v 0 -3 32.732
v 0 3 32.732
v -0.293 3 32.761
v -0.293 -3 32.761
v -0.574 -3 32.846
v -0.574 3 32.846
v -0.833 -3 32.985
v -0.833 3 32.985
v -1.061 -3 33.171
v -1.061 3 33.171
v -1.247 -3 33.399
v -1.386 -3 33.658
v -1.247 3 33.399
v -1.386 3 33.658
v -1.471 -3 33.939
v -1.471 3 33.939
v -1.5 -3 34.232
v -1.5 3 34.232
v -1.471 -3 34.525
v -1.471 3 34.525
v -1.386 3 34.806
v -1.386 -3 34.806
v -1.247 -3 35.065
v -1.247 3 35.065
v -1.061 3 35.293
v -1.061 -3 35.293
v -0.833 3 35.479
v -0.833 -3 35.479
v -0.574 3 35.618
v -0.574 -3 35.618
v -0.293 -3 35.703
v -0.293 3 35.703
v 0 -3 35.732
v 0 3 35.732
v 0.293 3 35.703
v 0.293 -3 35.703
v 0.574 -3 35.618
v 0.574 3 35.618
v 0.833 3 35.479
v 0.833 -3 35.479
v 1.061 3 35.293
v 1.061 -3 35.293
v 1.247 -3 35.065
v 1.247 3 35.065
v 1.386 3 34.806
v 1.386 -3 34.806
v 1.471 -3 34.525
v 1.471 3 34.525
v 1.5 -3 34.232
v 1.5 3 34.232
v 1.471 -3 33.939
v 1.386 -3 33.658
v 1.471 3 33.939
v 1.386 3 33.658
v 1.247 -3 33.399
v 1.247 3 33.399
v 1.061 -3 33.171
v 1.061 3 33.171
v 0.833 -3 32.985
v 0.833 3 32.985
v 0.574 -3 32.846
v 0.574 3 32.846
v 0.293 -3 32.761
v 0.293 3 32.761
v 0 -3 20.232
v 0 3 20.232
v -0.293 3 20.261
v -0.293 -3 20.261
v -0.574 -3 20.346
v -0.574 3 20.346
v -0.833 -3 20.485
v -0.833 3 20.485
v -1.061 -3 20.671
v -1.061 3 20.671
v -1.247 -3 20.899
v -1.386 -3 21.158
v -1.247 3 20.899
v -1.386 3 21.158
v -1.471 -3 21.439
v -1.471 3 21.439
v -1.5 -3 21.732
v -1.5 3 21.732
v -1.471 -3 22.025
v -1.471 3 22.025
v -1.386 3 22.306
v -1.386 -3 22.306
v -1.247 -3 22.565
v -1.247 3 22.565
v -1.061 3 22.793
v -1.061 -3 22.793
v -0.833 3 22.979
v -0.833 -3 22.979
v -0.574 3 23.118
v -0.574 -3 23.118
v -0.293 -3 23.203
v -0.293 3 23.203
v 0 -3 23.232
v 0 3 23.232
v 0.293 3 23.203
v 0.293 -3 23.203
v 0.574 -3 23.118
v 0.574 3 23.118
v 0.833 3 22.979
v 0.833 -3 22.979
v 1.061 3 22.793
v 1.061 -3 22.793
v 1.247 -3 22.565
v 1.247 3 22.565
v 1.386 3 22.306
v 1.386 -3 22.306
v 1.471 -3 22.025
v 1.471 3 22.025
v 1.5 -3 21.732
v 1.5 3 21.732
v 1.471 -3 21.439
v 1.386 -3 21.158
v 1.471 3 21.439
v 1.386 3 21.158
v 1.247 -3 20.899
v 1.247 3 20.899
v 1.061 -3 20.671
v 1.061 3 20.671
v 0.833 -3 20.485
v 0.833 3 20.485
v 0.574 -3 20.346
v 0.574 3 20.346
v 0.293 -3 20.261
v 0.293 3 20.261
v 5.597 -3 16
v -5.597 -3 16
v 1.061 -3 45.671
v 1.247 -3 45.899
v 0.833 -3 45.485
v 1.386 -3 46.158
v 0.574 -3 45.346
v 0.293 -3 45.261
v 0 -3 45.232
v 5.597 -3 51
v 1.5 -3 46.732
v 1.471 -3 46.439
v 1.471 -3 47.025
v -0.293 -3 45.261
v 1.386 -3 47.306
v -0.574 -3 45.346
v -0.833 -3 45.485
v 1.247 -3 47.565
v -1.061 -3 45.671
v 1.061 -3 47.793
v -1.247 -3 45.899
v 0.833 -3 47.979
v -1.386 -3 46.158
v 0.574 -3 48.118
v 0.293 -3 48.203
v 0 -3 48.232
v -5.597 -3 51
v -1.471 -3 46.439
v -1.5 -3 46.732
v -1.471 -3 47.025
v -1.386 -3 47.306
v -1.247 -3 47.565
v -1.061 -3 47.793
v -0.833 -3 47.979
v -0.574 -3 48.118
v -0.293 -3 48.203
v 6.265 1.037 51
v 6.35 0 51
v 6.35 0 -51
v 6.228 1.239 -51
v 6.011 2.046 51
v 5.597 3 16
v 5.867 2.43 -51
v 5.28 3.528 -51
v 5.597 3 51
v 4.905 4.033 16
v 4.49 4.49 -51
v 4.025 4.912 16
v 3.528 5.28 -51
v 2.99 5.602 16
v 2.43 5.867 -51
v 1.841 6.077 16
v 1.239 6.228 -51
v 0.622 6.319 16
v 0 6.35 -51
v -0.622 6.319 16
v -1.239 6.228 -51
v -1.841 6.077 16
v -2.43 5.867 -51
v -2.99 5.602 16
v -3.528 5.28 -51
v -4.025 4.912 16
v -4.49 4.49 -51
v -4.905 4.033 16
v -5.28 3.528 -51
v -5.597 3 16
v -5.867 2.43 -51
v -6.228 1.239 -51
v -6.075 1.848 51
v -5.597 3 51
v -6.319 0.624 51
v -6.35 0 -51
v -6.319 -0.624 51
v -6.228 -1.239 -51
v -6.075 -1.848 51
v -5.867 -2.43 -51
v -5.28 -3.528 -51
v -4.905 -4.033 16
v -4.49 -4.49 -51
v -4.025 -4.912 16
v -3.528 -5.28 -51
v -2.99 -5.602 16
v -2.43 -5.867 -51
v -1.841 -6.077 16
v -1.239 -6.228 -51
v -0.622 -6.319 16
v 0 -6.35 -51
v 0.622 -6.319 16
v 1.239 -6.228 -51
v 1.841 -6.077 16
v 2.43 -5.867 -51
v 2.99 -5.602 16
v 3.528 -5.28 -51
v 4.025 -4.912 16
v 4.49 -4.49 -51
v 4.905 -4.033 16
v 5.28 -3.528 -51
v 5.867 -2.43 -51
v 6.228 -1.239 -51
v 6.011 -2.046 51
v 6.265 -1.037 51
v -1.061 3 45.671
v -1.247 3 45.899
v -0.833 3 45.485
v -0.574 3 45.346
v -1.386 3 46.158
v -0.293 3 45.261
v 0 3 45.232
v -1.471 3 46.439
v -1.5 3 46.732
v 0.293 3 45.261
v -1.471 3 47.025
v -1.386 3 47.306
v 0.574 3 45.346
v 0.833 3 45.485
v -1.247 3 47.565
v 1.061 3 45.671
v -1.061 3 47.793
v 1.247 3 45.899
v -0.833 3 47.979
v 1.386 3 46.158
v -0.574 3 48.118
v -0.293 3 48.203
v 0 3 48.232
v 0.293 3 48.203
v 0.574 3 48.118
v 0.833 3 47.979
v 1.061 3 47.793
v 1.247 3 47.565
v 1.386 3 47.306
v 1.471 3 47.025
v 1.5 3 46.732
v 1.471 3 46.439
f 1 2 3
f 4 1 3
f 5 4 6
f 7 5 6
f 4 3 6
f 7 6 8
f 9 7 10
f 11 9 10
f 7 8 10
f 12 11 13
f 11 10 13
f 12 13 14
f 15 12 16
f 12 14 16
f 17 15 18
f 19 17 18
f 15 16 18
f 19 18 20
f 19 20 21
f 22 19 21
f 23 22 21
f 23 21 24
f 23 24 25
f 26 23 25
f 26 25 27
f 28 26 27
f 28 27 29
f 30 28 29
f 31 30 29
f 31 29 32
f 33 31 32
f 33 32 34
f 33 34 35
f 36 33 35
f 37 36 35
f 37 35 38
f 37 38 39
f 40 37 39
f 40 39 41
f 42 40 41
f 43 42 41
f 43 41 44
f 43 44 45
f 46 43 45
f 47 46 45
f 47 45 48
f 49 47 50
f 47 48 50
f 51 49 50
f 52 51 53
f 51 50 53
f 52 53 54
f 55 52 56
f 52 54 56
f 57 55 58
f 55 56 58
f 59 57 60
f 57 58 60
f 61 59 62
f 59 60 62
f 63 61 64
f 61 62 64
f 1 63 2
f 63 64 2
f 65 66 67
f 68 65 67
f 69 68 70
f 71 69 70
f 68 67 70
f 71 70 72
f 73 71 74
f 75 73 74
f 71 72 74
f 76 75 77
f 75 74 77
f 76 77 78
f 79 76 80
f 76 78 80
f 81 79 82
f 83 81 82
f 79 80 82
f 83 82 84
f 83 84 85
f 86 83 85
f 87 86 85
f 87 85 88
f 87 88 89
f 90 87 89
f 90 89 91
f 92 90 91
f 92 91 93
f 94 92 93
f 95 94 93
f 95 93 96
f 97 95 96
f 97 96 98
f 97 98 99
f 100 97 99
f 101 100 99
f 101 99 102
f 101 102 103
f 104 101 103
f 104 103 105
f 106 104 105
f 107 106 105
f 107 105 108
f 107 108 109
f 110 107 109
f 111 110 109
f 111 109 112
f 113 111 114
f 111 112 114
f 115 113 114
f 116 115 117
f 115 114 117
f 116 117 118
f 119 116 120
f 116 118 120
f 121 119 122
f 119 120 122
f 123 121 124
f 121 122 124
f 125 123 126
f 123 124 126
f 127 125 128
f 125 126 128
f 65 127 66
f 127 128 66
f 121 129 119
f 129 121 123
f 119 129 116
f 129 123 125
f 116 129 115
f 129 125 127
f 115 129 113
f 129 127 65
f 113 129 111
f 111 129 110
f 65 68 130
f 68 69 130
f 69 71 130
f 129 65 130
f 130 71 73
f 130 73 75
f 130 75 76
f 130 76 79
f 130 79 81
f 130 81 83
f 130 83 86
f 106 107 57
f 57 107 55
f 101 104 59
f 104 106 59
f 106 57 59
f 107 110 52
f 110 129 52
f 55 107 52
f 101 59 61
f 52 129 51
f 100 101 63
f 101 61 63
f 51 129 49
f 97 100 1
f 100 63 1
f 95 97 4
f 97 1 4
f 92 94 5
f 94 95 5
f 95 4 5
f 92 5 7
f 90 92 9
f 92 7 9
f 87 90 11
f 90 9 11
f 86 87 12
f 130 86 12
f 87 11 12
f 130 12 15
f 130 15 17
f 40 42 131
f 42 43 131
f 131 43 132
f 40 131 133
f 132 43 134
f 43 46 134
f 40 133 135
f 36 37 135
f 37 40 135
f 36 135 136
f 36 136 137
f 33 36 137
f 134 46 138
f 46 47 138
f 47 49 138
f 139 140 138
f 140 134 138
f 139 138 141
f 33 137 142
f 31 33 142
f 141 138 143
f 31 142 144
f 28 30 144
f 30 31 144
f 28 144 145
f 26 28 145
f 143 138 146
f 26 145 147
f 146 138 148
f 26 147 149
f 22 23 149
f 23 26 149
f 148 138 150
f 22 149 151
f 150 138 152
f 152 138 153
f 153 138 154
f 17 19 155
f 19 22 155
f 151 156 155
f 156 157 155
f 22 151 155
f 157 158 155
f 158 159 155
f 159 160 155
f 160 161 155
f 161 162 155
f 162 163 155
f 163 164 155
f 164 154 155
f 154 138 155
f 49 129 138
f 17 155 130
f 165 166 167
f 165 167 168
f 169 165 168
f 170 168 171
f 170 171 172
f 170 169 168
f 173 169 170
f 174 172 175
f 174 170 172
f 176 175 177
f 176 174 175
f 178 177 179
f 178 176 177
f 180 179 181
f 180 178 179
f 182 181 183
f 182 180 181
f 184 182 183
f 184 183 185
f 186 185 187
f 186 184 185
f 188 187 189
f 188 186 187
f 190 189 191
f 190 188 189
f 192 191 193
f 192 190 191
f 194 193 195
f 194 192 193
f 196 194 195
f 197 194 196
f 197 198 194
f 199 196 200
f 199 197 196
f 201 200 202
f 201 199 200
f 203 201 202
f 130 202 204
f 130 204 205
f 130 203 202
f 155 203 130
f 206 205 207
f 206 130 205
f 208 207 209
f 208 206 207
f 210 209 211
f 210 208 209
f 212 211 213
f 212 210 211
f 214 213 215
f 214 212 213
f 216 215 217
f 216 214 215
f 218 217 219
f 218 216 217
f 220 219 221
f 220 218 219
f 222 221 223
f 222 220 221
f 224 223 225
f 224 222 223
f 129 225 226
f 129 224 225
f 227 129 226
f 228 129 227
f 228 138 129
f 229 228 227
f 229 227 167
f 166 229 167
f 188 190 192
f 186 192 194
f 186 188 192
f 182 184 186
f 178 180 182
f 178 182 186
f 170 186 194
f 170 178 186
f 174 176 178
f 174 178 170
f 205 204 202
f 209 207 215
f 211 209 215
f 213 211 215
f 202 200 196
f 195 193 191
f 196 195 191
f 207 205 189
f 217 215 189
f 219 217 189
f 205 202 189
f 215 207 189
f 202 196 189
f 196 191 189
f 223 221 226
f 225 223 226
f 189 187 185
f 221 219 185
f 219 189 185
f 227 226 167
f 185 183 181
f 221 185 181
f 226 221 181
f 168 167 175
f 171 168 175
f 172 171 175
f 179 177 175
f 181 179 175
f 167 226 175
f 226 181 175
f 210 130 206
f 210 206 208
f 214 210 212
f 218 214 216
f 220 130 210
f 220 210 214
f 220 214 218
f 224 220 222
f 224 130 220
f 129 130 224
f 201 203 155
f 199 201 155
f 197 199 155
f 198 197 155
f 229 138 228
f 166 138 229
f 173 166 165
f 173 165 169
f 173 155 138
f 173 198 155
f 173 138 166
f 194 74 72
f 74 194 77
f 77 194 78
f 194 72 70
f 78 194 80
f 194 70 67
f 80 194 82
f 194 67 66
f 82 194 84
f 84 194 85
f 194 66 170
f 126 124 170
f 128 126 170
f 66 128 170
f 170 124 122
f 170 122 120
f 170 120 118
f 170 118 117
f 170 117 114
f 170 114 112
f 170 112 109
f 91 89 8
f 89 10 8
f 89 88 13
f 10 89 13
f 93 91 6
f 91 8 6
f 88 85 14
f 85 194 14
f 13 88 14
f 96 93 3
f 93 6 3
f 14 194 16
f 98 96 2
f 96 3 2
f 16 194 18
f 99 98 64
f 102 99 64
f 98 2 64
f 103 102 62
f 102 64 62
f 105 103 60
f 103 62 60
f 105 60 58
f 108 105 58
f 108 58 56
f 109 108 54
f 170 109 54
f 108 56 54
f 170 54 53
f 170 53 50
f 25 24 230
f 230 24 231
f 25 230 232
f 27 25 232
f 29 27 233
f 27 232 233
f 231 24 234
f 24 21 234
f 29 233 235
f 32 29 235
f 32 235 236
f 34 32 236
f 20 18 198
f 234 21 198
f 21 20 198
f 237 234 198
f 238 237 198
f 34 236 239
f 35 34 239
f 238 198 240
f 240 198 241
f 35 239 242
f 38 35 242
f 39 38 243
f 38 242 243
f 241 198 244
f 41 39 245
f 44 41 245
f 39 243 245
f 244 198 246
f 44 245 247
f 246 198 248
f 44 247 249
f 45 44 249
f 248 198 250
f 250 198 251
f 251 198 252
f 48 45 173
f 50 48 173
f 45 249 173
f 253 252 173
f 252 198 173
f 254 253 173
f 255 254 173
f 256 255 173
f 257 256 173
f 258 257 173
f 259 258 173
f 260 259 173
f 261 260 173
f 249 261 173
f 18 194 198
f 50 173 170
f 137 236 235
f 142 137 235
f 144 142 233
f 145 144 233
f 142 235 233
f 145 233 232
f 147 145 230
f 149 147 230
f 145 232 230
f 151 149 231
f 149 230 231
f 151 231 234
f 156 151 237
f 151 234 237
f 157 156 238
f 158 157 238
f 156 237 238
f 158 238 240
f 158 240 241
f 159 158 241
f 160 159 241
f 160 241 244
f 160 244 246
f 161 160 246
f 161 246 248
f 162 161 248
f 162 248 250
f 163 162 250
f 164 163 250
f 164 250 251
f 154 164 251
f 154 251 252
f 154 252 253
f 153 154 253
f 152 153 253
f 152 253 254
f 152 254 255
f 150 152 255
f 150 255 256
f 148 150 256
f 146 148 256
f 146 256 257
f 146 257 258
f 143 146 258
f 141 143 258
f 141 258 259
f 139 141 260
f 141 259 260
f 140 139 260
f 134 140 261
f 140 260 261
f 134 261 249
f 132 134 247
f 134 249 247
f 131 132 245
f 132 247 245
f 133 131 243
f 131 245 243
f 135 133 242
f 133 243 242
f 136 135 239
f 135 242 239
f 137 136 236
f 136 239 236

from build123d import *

# Parameters (mm, degrees)
SKETCH1_R           = 6.35
BOSS_EXTRUDE1_DEPTH = 51
CUT_EXTRUDE1_DEPTH  = 35
SKETCH3_R           = 1.5
CUT_EXTRUDE2_DEPTH  = 15


with BuildPart() as part:
    # Sketch1 → Boss-Extrude1 (new, symmetric)
    with BuildSketch(Plane.XY):
        Circle(SKETCH1_R)
    extrude(amount=BOSS_EXTRUDE1_DEPTH, both=True)

    # Sketch2 → Cut-Extrude1 (cut)
    with BuildSketch(Plane.XY.offset(51)):
        with BuildLine():
            ThreePointArc((5.596650784, 3), (0, 6.35), (-5.596650784, 3))
            Line((-5.596650784, 3), (5.596650784, 3))
        make_face()
        with BuildLine():
            Line((5.596650784, -3), (-5.596650784, -3))
            ThreePointArc((-5.596650784, -3), (0, -6.35), (5.596650784, -3))
        make_face()
    extrude(amount=-CUT_EXTRUDE1_DEPTH, mode=Mode.SUBTRACT)

    # Sketch3 → Cut-Extrude2 (cut)
    with BuildSketch(Plane(origin=(0, 3, 0), x_dir=(1, 0, 0), z_dir=(0, 1, 0))):
        with Locations(Location((0, -21.732039108, 0), (0, 0, 90))):
            Circle(SKETCH3_R)
        with Locations(Location((0, -34.232039108, 0), (0, 0, 90))):
            Circle(SKETCH3_R)
        with Locations(Location((0, -46.732039108, 0), (0, 0, 90))):
            Circle(SKETCH3_R)
    extrude(amount=-CUT_EXTRUDE2_DEPTH, mode=Mode.SUBTRACT)


solid = part.part
